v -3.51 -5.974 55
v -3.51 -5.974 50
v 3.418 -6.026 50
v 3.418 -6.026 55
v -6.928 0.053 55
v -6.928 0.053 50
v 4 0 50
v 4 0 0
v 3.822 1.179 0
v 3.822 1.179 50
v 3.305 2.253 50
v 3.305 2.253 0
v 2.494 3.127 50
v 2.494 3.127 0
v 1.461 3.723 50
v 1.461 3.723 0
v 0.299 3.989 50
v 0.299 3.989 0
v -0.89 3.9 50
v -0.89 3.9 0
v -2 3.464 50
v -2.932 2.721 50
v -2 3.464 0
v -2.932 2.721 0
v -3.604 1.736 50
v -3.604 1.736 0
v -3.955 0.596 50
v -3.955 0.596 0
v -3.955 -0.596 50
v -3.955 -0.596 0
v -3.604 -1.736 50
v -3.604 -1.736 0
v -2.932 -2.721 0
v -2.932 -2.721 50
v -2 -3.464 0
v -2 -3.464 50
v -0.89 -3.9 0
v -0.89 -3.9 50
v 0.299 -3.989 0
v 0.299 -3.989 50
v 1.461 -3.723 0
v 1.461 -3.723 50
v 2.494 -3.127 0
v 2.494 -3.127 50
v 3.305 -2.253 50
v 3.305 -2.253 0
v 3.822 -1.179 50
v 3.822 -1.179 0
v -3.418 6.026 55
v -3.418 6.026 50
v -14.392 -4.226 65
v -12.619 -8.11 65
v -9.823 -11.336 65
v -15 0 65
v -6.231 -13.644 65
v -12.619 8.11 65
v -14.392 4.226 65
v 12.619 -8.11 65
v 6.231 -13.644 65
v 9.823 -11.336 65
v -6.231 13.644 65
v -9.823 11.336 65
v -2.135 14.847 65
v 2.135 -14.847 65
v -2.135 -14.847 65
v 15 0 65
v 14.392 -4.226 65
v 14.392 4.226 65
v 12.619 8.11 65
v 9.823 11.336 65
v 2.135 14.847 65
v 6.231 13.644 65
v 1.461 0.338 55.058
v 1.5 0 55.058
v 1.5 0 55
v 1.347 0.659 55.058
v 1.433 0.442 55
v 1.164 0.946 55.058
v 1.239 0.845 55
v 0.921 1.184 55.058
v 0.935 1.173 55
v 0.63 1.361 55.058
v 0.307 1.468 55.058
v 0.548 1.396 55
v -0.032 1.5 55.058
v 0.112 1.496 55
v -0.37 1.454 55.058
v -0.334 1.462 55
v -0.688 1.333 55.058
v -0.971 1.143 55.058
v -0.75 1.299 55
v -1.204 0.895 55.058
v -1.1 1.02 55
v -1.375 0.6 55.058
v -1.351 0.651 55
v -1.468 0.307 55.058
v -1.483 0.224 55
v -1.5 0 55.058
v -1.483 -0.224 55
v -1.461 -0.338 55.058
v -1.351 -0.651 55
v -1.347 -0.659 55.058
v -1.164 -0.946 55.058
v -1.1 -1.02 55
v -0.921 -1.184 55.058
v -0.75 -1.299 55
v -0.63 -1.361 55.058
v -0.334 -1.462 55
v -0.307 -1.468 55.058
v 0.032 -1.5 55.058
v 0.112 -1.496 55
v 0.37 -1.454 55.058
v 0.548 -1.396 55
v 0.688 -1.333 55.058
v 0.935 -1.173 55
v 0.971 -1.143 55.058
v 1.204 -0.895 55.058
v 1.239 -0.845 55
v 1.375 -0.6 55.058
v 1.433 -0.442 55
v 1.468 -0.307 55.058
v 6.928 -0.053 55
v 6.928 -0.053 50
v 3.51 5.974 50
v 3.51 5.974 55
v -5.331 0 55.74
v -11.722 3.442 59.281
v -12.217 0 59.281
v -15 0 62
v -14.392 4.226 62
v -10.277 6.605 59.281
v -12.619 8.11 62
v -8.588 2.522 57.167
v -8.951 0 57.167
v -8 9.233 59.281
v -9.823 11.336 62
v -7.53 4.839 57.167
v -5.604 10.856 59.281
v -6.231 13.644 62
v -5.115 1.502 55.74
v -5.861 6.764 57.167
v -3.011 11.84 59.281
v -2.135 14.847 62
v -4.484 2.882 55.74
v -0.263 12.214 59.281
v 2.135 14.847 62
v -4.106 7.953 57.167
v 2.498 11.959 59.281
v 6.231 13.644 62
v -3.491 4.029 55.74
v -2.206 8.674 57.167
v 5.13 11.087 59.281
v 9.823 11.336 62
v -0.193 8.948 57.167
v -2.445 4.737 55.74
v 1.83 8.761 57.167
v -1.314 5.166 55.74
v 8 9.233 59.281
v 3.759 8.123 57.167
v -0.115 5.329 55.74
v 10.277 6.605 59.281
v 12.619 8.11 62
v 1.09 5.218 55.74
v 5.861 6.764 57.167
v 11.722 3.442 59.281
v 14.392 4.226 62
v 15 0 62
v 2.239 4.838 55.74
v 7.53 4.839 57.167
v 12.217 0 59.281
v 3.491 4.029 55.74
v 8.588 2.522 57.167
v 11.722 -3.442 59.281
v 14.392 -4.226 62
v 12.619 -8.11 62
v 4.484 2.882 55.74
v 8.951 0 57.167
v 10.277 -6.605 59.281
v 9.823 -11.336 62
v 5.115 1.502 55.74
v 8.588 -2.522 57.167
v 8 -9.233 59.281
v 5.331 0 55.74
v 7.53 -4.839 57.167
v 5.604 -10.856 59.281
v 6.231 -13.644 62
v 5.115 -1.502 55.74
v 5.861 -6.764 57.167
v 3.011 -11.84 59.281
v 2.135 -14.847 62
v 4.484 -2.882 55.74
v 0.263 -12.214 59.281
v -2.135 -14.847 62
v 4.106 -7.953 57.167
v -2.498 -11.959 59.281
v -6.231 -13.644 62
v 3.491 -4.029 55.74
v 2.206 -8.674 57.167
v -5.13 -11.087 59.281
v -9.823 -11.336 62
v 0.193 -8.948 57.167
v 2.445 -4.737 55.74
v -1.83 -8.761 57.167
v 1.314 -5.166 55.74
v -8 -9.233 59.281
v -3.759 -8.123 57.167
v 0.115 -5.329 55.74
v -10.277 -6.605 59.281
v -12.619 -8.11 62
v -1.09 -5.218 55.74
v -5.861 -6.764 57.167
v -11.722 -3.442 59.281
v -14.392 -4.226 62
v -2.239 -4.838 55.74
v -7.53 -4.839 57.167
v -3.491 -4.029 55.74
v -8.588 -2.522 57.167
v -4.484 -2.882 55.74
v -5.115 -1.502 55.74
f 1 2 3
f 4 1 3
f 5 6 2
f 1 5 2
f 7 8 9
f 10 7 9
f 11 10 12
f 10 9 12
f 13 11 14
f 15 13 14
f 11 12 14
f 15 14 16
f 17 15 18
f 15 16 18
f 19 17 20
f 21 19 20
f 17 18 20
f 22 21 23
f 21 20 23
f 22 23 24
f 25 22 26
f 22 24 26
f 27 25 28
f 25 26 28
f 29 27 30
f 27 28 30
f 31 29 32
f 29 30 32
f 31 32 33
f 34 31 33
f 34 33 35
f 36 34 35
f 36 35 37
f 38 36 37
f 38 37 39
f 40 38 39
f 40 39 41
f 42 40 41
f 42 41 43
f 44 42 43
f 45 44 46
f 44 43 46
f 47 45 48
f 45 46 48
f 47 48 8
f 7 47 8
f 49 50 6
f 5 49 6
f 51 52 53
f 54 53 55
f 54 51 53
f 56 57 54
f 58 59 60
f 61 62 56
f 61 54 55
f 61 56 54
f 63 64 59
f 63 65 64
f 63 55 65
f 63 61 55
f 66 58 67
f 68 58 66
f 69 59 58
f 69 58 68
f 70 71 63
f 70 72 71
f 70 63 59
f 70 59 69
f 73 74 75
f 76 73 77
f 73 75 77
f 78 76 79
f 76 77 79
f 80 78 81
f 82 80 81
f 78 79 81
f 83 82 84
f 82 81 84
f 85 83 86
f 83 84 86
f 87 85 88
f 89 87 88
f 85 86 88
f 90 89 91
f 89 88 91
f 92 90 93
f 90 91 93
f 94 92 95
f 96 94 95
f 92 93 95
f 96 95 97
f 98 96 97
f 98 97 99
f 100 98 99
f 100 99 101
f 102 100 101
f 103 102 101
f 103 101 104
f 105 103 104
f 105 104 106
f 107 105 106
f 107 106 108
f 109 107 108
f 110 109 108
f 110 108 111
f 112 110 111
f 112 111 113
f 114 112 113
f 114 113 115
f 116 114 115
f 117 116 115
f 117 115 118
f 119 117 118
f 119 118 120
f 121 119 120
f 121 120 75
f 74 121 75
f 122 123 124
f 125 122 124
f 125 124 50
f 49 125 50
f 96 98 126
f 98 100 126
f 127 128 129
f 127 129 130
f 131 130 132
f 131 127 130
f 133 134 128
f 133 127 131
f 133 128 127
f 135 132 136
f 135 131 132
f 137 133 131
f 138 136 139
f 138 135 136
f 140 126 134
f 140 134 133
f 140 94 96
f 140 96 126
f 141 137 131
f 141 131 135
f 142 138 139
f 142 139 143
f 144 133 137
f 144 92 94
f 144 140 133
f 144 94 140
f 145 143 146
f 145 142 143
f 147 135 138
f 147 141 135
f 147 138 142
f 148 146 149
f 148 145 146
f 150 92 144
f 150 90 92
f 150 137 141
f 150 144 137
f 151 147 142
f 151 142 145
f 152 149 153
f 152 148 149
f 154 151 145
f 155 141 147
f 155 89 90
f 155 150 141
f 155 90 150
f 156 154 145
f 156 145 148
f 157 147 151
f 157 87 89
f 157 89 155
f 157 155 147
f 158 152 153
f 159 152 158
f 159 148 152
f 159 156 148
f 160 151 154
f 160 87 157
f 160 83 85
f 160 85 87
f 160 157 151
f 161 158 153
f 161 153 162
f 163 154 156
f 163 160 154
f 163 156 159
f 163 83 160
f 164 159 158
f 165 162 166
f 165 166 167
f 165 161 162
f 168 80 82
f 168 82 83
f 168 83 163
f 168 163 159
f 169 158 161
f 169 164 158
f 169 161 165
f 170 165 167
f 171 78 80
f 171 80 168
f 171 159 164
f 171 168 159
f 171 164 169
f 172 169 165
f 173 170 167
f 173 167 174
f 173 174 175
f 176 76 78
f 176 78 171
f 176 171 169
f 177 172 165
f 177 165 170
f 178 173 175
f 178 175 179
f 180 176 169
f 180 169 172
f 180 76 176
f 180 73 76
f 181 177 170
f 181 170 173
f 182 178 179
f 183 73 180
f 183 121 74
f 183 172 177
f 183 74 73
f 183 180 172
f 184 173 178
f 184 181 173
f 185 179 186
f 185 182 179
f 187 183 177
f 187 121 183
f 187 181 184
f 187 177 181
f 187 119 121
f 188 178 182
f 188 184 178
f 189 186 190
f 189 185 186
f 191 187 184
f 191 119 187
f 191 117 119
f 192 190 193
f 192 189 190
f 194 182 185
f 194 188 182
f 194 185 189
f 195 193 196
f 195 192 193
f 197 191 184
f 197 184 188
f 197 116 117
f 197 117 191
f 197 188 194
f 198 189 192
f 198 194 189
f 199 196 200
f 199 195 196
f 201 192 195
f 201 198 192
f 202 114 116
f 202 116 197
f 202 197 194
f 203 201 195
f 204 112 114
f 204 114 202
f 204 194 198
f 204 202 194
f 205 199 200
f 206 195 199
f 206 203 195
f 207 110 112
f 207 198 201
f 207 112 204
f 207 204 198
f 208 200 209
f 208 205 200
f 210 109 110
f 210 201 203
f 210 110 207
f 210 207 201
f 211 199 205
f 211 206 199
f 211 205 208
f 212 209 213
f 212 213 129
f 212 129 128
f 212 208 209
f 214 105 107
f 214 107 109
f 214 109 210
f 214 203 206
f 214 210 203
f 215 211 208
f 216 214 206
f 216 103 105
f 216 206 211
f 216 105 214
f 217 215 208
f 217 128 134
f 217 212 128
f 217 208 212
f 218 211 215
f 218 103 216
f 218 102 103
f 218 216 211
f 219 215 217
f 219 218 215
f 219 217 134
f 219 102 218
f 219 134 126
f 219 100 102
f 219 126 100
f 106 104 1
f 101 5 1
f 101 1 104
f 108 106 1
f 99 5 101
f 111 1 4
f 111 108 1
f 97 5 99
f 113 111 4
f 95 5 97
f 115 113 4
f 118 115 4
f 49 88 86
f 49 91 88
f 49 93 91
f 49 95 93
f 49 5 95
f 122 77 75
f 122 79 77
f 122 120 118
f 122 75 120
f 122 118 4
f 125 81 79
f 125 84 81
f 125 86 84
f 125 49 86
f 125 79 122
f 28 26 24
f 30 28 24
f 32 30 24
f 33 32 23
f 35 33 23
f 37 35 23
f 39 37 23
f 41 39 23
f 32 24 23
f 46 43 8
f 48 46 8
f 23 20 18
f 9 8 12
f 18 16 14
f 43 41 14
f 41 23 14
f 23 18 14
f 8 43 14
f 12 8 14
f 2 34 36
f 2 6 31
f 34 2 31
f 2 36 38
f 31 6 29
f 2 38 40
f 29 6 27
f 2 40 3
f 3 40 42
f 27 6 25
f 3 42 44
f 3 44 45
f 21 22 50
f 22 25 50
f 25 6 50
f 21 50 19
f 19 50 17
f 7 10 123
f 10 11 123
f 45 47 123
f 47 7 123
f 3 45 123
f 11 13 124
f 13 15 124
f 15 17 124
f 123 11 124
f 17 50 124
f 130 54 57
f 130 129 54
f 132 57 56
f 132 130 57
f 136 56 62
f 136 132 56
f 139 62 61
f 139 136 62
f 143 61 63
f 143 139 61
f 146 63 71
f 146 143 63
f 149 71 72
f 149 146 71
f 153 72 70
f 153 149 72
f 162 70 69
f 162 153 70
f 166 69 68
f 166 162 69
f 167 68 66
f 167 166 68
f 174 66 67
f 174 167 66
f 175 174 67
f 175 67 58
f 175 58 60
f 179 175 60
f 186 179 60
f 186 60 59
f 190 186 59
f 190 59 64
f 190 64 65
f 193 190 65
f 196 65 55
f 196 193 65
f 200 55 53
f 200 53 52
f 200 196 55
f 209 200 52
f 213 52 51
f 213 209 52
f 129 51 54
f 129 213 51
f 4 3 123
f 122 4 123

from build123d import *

# Parameters (mm, degrees)
F0_R     = 4
F1_DEPTH = 50
F3_DEPTH = 5
F4_R     = 1.5
F5_DEPTH = 5


with BuildPart() as f1:
    # F0 (on Top) → F1 (new body)
    with BuildSketch(Plane.XY):
        Circle(F0_R)
    extrude(amount=F1_DEPTH)

    # F2 (on face) → F3 (join)
    with BuildSketch(Plane.XY.offset(50)):
        Polygon((6.928004, -0.052545), (3.509508, 5.973555), (-3.418496, 6.0261), (-6.928004, 0.052545), (-3.509508, -5.973555), (3.418496, -6.0261), align=None)
    extrude(amount=F3_DEPTH)

    # F4 (on face) → F5 (join)
    with BuildSketch(Plane.XY.offset(55)):
        Circle(F4_R)
    extrude(amount=F5_DEPTH)

    # F6 (on Front) → F7 (revolve)
    with BuildSketch(Plane.XZ):
        with BuildLine():
            Line((-15, 65), (-15, 62))
            ThreePointArc((-15, 62), (-8.276473, 56.83613), (0, 55))
            Line((0, 55), (0, 65))
            Line((0, 65), (-15, 65))
        make_face()
    revolve(axis=Axis((0, 0, 60), (0, 0, -1)))


solid = f1.part
